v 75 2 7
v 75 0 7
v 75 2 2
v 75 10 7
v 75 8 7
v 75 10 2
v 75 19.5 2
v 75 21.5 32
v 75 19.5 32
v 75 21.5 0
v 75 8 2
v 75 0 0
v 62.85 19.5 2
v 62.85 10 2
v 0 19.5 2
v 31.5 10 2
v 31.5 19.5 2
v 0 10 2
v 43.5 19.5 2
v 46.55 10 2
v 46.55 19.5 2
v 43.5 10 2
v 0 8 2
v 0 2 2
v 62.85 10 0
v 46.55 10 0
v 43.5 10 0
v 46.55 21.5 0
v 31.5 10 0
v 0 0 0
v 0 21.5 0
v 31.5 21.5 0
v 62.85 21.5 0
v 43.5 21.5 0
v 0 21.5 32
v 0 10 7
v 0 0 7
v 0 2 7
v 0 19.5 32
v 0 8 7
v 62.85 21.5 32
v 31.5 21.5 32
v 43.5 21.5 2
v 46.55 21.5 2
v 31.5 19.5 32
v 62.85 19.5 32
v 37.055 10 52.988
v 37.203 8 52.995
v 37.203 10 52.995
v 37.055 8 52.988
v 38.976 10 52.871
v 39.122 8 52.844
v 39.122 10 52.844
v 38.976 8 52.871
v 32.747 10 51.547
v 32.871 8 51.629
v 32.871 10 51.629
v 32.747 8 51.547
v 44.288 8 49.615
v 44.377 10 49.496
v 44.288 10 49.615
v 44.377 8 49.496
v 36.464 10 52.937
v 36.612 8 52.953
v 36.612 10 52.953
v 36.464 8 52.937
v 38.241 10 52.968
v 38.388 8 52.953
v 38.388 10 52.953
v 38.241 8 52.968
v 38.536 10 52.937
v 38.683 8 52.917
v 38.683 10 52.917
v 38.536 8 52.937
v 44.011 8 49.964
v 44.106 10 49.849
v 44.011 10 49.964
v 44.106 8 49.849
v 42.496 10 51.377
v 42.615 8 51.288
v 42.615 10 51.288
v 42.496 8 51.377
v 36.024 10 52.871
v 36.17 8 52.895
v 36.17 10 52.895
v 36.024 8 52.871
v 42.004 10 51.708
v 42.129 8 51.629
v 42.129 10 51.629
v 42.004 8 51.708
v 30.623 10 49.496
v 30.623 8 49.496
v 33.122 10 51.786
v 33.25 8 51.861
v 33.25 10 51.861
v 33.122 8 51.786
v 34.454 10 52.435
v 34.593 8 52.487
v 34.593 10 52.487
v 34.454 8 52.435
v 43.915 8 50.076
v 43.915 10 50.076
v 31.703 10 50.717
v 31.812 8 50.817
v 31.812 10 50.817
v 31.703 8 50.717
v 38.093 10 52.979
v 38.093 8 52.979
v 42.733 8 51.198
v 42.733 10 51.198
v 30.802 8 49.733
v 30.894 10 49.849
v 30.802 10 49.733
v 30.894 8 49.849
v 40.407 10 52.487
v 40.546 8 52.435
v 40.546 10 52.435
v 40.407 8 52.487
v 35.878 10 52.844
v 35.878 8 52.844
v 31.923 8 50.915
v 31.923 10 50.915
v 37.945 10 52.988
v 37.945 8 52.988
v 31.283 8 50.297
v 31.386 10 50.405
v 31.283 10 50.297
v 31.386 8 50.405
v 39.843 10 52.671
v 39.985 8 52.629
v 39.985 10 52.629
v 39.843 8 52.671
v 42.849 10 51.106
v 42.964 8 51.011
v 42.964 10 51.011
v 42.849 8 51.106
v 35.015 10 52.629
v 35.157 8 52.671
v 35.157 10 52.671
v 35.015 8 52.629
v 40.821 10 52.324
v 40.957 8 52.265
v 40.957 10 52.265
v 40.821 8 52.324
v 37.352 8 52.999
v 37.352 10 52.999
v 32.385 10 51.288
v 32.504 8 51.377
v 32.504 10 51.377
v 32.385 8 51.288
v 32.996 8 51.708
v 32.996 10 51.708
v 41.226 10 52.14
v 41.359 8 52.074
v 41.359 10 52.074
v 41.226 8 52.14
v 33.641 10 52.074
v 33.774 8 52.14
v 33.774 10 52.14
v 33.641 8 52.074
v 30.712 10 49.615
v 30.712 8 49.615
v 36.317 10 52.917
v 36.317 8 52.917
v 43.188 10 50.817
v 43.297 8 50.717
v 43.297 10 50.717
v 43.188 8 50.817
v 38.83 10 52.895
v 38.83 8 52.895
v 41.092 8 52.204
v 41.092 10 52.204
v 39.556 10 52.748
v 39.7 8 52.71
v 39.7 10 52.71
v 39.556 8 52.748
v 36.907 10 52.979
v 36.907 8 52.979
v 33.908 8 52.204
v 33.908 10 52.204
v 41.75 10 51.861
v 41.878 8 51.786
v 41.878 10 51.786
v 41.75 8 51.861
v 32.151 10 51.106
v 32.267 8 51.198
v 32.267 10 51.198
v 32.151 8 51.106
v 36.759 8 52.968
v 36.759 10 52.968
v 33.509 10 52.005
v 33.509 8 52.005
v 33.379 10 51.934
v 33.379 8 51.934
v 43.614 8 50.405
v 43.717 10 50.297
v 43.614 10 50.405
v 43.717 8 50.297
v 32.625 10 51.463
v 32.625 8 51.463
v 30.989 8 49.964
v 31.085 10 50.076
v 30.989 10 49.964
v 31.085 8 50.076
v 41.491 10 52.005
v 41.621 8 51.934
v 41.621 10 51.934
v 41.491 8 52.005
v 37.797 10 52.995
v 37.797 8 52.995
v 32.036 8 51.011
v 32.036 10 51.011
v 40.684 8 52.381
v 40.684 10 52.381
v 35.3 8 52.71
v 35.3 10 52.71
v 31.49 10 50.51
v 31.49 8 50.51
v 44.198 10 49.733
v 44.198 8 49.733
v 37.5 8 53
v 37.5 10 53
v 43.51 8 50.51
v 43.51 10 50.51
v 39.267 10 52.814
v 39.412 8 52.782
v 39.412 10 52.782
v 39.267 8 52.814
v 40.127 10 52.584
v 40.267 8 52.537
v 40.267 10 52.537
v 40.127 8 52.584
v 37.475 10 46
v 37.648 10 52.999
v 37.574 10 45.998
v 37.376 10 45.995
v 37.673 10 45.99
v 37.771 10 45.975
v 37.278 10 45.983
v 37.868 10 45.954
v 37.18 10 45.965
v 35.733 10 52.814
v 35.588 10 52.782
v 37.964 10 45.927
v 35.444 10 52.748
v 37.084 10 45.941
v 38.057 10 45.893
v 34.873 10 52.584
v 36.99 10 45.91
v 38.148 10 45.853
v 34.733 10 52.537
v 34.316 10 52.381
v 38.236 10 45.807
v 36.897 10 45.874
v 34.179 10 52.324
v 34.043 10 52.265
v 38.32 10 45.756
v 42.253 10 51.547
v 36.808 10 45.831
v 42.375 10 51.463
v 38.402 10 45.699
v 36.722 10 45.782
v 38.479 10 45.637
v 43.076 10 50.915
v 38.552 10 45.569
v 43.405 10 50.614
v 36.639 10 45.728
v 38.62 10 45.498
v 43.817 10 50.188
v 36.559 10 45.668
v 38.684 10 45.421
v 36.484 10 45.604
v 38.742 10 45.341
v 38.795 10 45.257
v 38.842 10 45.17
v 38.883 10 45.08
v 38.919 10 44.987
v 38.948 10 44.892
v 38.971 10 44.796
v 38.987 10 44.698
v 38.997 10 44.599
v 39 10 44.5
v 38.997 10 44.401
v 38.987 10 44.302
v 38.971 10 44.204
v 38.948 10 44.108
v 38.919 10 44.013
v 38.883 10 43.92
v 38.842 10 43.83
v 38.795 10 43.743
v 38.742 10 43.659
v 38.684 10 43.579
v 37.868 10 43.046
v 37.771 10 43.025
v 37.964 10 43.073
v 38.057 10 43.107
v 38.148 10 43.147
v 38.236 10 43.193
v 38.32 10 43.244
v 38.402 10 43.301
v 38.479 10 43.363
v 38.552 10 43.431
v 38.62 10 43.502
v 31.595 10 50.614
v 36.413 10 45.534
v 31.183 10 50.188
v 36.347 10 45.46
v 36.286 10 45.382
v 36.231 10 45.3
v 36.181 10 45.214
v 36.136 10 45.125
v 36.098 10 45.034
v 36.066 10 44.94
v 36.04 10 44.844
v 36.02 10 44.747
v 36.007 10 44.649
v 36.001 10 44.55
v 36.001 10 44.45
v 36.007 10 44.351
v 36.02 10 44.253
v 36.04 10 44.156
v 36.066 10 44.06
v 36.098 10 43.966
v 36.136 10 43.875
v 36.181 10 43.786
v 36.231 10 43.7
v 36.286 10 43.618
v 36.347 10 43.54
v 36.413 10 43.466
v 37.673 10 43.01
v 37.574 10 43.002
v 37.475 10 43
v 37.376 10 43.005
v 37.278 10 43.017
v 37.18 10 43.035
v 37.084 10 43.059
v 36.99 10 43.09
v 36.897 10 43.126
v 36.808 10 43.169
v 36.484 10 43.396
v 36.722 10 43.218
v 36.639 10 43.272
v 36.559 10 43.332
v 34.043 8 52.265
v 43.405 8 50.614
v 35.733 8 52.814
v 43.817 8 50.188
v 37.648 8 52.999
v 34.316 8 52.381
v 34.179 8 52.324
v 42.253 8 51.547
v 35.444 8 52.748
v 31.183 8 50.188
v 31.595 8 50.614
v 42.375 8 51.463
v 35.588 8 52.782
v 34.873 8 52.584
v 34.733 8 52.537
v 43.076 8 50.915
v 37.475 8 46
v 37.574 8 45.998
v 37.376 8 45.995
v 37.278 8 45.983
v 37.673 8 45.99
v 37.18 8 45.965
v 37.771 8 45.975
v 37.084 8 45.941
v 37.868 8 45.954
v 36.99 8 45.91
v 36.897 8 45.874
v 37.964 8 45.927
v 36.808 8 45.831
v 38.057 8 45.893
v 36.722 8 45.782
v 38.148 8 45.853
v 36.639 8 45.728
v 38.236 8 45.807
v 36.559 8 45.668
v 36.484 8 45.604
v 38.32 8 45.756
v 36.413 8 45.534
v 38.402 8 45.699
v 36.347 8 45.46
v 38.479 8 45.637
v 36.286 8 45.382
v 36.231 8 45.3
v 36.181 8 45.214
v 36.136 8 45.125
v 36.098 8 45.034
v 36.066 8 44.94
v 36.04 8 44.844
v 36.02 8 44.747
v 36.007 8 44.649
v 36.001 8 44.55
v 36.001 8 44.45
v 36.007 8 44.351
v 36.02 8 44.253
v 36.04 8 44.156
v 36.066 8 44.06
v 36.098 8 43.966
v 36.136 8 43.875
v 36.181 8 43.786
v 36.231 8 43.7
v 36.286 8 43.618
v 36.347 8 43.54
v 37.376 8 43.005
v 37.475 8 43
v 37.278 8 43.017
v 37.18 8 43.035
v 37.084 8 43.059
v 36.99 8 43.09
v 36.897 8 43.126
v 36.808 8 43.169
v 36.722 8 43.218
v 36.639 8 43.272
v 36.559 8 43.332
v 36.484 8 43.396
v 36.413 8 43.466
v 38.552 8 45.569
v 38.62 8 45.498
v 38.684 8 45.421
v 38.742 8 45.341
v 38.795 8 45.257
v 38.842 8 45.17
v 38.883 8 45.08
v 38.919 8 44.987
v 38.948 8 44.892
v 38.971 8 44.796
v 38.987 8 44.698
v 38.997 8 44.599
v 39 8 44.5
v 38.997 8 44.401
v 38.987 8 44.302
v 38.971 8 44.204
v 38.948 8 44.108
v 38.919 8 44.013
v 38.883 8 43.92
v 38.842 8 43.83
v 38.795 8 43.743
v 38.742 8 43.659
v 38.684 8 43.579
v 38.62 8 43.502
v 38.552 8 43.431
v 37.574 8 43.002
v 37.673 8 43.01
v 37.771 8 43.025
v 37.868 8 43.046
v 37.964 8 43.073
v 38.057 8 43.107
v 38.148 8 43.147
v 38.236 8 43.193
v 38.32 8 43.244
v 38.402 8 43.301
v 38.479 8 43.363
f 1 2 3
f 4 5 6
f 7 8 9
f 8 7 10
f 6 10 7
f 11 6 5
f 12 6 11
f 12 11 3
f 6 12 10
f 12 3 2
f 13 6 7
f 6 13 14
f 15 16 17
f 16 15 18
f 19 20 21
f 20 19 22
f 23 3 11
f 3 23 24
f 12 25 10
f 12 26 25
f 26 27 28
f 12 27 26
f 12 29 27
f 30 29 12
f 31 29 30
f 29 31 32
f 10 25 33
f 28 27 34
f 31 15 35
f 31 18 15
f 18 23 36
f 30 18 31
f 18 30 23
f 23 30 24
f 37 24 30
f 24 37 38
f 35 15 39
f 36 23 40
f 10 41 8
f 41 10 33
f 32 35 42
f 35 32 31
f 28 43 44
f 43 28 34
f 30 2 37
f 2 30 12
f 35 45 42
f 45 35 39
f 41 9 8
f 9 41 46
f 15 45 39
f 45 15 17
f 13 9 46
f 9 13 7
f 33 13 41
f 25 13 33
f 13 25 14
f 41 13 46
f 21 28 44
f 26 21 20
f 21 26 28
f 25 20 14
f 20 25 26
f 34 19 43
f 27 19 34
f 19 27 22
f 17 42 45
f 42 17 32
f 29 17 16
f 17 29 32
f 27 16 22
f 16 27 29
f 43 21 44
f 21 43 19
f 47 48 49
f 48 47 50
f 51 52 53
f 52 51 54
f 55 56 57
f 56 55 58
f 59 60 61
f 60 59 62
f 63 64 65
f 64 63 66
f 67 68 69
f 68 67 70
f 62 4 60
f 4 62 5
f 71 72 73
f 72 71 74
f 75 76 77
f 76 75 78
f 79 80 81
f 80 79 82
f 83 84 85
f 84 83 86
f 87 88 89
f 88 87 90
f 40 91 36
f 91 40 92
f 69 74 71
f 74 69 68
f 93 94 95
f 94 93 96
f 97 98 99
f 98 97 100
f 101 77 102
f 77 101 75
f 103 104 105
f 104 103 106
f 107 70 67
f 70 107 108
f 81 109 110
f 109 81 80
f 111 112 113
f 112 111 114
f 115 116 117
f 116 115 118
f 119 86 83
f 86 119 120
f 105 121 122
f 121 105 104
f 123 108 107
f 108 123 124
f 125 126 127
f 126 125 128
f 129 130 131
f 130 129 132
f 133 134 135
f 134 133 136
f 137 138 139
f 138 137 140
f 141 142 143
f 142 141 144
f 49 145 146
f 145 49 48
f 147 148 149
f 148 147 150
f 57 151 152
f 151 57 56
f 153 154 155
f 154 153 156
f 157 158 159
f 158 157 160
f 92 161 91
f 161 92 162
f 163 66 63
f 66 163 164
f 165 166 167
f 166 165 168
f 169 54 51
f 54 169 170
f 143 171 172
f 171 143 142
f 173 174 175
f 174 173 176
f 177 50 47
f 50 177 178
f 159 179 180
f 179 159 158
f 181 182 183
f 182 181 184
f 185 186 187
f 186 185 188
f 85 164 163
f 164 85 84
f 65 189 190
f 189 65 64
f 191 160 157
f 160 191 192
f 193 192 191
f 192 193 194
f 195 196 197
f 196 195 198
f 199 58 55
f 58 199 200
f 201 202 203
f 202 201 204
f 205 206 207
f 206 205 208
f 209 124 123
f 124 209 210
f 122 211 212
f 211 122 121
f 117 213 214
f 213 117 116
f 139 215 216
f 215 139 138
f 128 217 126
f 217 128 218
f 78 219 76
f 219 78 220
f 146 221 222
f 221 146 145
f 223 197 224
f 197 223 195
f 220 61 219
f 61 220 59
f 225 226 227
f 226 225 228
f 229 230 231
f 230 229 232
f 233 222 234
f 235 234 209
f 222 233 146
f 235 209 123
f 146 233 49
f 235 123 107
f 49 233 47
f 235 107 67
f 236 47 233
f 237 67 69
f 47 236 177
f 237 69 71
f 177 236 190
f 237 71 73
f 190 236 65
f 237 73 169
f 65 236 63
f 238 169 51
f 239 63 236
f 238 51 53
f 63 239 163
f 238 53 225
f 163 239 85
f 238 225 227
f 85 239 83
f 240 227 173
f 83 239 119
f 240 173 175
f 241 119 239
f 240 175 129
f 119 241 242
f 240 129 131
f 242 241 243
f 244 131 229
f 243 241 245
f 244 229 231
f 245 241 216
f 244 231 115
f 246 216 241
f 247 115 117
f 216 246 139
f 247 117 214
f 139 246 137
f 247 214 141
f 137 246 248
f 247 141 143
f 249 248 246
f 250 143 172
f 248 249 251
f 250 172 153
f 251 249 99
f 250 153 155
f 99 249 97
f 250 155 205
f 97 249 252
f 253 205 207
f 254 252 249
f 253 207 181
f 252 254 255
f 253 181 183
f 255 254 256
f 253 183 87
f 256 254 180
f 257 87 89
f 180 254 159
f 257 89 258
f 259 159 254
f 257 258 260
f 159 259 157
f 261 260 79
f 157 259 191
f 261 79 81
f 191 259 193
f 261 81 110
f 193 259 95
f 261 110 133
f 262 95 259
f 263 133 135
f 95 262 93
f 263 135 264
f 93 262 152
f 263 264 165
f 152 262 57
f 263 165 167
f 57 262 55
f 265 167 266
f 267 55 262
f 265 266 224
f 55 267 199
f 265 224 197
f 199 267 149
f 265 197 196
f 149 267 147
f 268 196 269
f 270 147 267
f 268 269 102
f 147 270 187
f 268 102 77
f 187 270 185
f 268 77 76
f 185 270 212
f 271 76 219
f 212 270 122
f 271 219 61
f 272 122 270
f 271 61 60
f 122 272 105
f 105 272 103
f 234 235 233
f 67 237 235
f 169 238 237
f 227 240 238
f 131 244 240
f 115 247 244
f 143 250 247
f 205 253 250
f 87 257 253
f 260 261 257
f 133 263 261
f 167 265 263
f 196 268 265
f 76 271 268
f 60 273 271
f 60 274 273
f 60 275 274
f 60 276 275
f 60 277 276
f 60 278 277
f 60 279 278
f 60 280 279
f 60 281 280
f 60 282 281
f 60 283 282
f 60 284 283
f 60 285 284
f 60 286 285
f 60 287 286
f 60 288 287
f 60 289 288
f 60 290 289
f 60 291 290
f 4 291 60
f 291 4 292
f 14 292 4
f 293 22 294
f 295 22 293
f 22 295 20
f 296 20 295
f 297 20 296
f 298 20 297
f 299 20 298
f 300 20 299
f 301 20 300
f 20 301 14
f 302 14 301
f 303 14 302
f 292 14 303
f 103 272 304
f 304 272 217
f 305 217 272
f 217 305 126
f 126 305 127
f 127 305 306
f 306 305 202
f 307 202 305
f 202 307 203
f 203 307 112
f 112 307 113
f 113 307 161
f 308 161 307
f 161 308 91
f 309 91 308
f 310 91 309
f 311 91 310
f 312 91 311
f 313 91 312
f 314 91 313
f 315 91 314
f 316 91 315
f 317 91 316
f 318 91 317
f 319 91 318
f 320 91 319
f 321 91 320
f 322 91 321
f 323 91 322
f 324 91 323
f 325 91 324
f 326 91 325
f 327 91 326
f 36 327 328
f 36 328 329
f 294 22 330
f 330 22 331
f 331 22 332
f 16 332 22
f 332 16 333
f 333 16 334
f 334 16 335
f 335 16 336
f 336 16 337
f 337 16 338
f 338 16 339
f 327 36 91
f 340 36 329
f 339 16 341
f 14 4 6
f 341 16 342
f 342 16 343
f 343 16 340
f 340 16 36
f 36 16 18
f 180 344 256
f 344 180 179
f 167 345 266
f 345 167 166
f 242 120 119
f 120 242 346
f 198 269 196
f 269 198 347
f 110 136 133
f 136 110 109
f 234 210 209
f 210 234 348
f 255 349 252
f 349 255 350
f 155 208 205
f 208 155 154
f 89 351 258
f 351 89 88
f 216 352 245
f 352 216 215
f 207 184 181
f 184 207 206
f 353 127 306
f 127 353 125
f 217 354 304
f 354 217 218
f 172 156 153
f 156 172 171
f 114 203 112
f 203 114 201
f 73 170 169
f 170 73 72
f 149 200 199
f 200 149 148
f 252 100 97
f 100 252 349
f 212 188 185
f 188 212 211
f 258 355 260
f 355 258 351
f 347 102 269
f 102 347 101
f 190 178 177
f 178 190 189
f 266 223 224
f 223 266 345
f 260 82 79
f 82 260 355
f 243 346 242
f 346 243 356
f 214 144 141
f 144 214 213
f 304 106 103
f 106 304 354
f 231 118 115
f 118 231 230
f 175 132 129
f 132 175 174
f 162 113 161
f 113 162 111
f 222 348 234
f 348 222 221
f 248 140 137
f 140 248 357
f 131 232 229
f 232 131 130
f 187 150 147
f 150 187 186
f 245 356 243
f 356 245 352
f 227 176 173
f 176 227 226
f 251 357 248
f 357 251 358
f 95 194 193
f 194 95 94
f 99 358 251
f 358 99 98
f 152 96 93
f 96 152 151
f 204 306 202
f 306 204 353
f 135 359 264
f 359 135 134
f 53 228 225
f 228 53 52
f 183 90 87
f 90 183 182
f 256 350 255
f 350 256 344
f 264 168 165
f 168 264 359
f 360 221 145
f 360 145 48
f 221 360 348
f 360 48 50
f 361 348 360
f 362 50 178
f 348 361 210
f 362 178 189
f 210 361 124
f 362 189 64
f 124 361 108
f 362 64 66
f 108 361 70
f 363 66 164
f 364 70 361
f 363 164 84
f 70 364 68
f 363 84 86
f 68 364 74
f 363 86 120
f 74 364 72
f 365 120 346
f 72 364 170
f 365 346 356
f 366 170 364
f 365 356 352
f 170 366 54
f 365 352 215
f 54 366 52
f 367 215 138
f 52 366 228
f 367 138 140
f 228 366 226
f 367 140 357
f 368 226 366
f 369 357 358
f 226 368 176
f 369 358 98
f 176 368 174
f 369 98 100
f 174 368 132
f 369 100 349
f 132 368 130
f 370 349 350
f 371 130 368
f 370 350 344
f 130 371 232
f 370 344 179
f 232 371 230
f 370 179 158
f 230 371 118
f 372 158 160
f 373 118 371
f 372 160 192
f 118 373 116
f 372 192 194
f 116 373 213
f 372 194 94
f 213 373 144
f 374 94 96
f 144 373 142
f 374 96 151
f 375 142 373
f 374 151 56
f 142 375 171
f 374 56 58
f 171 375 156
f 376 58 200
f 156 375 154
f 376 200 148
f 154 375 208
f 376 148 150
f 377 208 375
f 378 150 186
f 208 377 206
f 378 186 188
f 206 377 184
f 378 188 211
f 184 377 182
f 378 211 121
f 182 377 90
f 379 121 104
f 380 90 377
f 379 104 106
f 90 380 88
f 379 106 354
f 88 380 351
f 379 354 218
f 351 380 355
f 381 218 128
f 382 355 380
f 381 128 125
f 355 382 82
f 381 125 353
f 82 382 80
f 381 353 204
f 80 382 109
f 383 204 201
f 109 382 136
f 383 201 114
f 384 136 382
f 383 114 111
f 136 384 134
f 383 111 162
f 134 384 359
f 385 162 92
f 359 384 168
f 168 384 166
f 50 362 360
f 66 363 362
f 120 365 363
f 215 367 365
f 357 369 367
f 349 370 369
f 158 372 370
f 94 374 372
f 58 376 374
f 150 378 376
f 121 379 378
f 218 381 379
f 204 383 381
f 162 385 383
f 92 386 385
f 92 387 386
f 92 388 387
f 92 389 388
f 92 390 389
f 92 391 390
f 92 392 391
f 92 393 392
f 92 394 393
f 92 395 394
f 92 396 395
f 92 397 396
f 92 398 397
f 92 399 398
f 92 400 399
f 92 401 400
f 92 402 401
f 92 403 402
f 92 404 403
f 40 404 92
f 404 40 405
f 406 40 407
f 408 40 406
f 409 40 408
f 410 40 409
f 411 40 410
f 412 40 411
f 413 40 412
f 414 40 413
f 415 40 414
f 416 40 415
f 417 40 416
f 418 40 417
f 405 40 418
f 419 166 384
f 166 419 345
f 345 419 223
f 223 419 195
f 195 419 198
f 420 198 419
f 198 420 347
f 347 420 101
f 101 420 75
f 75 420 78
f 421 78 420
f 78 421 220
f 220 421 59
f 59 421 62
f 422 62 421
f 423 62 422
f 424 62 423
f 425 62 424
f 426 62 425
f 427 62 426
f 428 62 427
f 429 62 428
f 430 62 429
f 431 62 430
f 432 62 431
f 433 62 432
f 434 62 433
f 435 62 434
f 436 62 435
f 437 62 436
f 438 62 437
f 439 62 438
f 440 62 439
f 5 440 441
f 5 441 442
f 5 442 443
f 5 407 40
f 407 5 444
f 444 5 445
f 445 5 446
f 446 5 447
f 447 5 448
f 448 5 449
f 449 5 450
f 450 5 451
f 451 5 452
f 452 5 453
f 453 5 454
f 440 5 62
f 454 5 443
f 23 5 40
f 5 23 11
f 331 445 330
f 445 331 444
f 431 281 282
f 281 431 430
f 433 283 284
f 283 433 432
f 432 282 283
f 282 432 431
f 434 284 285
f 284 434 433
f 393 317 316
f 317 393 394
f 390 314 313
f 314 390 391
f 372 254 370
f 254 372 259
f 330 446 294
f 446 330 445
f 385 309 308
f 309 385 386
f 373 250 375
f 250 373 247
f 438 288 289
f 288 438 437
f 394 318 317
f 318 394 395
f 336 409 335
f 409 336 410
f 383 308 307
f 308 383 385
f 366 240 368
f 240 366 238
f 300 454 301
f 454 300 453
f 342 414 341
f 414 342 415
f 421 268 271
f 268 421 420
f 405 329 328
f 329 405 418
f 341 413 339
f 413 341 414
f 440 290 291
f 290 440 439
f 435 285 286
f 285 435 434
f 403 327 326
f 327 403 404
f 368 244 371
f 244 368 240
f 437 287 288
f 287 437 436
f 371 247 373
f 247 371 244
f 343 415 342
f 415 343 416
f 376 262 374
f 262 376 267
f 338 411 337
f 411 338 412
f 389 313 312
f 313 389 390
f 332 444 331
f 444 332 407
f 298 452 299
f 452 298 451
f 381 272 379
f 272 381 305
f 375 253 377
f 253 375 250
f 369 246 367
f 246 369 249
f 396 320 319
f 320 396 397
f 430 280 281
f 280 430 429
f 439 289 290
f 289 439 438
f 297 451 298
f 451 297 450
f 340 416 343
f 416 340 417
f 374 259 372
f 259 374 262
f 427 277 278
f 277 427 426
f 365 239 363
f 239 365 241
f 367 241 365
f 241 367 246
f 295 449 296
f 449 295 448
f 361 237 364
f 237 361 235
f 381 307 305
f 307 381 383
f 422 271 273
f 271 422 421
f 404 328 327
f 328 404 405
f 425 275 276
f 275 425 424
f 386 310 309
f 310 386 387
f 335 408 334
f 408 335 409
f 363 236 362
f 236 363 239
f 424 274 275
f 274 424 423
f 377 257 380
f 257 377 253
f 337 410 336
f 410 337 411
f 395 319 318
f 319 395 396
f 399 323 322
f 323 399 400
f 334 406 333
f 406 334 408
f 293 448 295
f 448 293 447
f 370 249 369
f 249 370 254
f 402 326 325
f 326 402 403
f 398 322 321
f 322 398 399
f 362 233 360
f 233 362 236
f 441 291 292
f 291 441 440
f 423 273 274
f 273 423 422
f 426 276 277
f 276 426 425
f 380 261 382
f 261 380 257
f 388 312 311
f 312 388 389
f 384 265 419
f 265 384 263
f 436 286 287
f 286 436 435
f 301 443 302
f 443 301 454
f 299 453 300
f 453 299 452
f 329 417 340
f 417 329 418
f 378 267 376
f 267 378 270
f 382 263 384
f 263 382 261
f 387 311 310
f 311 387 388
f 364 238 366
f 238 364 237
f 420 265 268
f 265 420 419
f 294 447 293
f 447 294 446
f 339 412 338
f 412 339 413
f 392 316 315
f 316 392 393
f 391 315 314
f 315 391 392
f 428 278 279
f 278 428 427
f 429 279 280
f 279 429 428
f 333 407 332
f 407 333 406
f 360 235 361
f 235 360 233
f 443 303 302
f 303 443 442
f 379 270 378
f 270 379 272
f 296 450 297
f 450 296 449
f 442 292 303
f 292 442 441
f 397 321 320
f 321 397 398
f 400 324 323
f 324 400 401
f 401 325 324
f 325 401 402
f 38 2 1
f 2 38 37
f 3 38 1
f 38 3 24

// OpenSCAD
//Measurements.
wood_thickness = 6.0; //Actually 5.7 but with some play.
screw_height = 42.5;
screw_radius = 1.5;
cord_gap_width = 12; //Actually 11.5 but with some play.
phone_width = 75; //Actually 74.5 but with some play.
phone_thickness = 9.5; //Actually 9.2 but with some play.
jack_gap_width = 16.3; //Actually 15.9 but with some play.
jack_gap_position = 20.3;

//Settings.
thickness = 2;
screw_holder_thickness = 7; //Bit thicker here please.
height = 30;
back_height = 5;
$fs = 0.1;
$fa = 1;

//Actual model.
//-------------
cube([phone_width, thickness, thickness + back_height]); //Backplate.

difference() {
	union() {
		cube([phone_width, thickness + wood_thickness + thickness + phone_thickness + thickness, thickness]); //Bottom plate.
		translate([0, thickness + wood_thickness + thickness + phone_thickness, thickness]) {
			cube([phone_width, thickness, height]); //Front plate.
		}
	}
	translate([phone_width - jack_gap_position - jack_gap_width / 2, thickness + wood_thickness + thickness, 0]) {
		cube([jack_gap_width, phone_width + thickness, thickness + height]); //Jack gap.
	}
	translate([phone_width / 2 - cord_gap_width / 2, thickness + wood_thickness + thickness, 0]) {
		cube([cord_gap_width, phone_width + thickness, thickness + height]); //Cord gap.
	}
	translate([phone_width / 2 + cord_gap_width / 2, thickness + wood_thickness + thickness + phone_thickness, thickness]) {
		cube([phone_width / 2 - cord_gap_width / 2 - jack_gap_position - jack_gap_width / 2, thickness, height]); //Pin between cord gap and jack gap doesn't extend upwards.
	}
}

translate([0, thickness + wood_thickness, thickness]) {
	difference() {
		hull() {
			cube([phone_width, thickness, back_height]);
			translate([phone_width / 2, 0, screw_height]) {
				rotate([-90, 0, 0]) {
					cylinder(r=screw_radius + screw_holder_thickness, h=thickness);
				}
			}
		}
		translate([phone_width / 2, 0, screw_height]) {
			rotate([-90, 0, 0]) {
				cylinder(r=screw_radius, h=thickness + 0.1); //Extra 0.1 for rounding errors in OpenSCAD.
			}
		}
	}
}
